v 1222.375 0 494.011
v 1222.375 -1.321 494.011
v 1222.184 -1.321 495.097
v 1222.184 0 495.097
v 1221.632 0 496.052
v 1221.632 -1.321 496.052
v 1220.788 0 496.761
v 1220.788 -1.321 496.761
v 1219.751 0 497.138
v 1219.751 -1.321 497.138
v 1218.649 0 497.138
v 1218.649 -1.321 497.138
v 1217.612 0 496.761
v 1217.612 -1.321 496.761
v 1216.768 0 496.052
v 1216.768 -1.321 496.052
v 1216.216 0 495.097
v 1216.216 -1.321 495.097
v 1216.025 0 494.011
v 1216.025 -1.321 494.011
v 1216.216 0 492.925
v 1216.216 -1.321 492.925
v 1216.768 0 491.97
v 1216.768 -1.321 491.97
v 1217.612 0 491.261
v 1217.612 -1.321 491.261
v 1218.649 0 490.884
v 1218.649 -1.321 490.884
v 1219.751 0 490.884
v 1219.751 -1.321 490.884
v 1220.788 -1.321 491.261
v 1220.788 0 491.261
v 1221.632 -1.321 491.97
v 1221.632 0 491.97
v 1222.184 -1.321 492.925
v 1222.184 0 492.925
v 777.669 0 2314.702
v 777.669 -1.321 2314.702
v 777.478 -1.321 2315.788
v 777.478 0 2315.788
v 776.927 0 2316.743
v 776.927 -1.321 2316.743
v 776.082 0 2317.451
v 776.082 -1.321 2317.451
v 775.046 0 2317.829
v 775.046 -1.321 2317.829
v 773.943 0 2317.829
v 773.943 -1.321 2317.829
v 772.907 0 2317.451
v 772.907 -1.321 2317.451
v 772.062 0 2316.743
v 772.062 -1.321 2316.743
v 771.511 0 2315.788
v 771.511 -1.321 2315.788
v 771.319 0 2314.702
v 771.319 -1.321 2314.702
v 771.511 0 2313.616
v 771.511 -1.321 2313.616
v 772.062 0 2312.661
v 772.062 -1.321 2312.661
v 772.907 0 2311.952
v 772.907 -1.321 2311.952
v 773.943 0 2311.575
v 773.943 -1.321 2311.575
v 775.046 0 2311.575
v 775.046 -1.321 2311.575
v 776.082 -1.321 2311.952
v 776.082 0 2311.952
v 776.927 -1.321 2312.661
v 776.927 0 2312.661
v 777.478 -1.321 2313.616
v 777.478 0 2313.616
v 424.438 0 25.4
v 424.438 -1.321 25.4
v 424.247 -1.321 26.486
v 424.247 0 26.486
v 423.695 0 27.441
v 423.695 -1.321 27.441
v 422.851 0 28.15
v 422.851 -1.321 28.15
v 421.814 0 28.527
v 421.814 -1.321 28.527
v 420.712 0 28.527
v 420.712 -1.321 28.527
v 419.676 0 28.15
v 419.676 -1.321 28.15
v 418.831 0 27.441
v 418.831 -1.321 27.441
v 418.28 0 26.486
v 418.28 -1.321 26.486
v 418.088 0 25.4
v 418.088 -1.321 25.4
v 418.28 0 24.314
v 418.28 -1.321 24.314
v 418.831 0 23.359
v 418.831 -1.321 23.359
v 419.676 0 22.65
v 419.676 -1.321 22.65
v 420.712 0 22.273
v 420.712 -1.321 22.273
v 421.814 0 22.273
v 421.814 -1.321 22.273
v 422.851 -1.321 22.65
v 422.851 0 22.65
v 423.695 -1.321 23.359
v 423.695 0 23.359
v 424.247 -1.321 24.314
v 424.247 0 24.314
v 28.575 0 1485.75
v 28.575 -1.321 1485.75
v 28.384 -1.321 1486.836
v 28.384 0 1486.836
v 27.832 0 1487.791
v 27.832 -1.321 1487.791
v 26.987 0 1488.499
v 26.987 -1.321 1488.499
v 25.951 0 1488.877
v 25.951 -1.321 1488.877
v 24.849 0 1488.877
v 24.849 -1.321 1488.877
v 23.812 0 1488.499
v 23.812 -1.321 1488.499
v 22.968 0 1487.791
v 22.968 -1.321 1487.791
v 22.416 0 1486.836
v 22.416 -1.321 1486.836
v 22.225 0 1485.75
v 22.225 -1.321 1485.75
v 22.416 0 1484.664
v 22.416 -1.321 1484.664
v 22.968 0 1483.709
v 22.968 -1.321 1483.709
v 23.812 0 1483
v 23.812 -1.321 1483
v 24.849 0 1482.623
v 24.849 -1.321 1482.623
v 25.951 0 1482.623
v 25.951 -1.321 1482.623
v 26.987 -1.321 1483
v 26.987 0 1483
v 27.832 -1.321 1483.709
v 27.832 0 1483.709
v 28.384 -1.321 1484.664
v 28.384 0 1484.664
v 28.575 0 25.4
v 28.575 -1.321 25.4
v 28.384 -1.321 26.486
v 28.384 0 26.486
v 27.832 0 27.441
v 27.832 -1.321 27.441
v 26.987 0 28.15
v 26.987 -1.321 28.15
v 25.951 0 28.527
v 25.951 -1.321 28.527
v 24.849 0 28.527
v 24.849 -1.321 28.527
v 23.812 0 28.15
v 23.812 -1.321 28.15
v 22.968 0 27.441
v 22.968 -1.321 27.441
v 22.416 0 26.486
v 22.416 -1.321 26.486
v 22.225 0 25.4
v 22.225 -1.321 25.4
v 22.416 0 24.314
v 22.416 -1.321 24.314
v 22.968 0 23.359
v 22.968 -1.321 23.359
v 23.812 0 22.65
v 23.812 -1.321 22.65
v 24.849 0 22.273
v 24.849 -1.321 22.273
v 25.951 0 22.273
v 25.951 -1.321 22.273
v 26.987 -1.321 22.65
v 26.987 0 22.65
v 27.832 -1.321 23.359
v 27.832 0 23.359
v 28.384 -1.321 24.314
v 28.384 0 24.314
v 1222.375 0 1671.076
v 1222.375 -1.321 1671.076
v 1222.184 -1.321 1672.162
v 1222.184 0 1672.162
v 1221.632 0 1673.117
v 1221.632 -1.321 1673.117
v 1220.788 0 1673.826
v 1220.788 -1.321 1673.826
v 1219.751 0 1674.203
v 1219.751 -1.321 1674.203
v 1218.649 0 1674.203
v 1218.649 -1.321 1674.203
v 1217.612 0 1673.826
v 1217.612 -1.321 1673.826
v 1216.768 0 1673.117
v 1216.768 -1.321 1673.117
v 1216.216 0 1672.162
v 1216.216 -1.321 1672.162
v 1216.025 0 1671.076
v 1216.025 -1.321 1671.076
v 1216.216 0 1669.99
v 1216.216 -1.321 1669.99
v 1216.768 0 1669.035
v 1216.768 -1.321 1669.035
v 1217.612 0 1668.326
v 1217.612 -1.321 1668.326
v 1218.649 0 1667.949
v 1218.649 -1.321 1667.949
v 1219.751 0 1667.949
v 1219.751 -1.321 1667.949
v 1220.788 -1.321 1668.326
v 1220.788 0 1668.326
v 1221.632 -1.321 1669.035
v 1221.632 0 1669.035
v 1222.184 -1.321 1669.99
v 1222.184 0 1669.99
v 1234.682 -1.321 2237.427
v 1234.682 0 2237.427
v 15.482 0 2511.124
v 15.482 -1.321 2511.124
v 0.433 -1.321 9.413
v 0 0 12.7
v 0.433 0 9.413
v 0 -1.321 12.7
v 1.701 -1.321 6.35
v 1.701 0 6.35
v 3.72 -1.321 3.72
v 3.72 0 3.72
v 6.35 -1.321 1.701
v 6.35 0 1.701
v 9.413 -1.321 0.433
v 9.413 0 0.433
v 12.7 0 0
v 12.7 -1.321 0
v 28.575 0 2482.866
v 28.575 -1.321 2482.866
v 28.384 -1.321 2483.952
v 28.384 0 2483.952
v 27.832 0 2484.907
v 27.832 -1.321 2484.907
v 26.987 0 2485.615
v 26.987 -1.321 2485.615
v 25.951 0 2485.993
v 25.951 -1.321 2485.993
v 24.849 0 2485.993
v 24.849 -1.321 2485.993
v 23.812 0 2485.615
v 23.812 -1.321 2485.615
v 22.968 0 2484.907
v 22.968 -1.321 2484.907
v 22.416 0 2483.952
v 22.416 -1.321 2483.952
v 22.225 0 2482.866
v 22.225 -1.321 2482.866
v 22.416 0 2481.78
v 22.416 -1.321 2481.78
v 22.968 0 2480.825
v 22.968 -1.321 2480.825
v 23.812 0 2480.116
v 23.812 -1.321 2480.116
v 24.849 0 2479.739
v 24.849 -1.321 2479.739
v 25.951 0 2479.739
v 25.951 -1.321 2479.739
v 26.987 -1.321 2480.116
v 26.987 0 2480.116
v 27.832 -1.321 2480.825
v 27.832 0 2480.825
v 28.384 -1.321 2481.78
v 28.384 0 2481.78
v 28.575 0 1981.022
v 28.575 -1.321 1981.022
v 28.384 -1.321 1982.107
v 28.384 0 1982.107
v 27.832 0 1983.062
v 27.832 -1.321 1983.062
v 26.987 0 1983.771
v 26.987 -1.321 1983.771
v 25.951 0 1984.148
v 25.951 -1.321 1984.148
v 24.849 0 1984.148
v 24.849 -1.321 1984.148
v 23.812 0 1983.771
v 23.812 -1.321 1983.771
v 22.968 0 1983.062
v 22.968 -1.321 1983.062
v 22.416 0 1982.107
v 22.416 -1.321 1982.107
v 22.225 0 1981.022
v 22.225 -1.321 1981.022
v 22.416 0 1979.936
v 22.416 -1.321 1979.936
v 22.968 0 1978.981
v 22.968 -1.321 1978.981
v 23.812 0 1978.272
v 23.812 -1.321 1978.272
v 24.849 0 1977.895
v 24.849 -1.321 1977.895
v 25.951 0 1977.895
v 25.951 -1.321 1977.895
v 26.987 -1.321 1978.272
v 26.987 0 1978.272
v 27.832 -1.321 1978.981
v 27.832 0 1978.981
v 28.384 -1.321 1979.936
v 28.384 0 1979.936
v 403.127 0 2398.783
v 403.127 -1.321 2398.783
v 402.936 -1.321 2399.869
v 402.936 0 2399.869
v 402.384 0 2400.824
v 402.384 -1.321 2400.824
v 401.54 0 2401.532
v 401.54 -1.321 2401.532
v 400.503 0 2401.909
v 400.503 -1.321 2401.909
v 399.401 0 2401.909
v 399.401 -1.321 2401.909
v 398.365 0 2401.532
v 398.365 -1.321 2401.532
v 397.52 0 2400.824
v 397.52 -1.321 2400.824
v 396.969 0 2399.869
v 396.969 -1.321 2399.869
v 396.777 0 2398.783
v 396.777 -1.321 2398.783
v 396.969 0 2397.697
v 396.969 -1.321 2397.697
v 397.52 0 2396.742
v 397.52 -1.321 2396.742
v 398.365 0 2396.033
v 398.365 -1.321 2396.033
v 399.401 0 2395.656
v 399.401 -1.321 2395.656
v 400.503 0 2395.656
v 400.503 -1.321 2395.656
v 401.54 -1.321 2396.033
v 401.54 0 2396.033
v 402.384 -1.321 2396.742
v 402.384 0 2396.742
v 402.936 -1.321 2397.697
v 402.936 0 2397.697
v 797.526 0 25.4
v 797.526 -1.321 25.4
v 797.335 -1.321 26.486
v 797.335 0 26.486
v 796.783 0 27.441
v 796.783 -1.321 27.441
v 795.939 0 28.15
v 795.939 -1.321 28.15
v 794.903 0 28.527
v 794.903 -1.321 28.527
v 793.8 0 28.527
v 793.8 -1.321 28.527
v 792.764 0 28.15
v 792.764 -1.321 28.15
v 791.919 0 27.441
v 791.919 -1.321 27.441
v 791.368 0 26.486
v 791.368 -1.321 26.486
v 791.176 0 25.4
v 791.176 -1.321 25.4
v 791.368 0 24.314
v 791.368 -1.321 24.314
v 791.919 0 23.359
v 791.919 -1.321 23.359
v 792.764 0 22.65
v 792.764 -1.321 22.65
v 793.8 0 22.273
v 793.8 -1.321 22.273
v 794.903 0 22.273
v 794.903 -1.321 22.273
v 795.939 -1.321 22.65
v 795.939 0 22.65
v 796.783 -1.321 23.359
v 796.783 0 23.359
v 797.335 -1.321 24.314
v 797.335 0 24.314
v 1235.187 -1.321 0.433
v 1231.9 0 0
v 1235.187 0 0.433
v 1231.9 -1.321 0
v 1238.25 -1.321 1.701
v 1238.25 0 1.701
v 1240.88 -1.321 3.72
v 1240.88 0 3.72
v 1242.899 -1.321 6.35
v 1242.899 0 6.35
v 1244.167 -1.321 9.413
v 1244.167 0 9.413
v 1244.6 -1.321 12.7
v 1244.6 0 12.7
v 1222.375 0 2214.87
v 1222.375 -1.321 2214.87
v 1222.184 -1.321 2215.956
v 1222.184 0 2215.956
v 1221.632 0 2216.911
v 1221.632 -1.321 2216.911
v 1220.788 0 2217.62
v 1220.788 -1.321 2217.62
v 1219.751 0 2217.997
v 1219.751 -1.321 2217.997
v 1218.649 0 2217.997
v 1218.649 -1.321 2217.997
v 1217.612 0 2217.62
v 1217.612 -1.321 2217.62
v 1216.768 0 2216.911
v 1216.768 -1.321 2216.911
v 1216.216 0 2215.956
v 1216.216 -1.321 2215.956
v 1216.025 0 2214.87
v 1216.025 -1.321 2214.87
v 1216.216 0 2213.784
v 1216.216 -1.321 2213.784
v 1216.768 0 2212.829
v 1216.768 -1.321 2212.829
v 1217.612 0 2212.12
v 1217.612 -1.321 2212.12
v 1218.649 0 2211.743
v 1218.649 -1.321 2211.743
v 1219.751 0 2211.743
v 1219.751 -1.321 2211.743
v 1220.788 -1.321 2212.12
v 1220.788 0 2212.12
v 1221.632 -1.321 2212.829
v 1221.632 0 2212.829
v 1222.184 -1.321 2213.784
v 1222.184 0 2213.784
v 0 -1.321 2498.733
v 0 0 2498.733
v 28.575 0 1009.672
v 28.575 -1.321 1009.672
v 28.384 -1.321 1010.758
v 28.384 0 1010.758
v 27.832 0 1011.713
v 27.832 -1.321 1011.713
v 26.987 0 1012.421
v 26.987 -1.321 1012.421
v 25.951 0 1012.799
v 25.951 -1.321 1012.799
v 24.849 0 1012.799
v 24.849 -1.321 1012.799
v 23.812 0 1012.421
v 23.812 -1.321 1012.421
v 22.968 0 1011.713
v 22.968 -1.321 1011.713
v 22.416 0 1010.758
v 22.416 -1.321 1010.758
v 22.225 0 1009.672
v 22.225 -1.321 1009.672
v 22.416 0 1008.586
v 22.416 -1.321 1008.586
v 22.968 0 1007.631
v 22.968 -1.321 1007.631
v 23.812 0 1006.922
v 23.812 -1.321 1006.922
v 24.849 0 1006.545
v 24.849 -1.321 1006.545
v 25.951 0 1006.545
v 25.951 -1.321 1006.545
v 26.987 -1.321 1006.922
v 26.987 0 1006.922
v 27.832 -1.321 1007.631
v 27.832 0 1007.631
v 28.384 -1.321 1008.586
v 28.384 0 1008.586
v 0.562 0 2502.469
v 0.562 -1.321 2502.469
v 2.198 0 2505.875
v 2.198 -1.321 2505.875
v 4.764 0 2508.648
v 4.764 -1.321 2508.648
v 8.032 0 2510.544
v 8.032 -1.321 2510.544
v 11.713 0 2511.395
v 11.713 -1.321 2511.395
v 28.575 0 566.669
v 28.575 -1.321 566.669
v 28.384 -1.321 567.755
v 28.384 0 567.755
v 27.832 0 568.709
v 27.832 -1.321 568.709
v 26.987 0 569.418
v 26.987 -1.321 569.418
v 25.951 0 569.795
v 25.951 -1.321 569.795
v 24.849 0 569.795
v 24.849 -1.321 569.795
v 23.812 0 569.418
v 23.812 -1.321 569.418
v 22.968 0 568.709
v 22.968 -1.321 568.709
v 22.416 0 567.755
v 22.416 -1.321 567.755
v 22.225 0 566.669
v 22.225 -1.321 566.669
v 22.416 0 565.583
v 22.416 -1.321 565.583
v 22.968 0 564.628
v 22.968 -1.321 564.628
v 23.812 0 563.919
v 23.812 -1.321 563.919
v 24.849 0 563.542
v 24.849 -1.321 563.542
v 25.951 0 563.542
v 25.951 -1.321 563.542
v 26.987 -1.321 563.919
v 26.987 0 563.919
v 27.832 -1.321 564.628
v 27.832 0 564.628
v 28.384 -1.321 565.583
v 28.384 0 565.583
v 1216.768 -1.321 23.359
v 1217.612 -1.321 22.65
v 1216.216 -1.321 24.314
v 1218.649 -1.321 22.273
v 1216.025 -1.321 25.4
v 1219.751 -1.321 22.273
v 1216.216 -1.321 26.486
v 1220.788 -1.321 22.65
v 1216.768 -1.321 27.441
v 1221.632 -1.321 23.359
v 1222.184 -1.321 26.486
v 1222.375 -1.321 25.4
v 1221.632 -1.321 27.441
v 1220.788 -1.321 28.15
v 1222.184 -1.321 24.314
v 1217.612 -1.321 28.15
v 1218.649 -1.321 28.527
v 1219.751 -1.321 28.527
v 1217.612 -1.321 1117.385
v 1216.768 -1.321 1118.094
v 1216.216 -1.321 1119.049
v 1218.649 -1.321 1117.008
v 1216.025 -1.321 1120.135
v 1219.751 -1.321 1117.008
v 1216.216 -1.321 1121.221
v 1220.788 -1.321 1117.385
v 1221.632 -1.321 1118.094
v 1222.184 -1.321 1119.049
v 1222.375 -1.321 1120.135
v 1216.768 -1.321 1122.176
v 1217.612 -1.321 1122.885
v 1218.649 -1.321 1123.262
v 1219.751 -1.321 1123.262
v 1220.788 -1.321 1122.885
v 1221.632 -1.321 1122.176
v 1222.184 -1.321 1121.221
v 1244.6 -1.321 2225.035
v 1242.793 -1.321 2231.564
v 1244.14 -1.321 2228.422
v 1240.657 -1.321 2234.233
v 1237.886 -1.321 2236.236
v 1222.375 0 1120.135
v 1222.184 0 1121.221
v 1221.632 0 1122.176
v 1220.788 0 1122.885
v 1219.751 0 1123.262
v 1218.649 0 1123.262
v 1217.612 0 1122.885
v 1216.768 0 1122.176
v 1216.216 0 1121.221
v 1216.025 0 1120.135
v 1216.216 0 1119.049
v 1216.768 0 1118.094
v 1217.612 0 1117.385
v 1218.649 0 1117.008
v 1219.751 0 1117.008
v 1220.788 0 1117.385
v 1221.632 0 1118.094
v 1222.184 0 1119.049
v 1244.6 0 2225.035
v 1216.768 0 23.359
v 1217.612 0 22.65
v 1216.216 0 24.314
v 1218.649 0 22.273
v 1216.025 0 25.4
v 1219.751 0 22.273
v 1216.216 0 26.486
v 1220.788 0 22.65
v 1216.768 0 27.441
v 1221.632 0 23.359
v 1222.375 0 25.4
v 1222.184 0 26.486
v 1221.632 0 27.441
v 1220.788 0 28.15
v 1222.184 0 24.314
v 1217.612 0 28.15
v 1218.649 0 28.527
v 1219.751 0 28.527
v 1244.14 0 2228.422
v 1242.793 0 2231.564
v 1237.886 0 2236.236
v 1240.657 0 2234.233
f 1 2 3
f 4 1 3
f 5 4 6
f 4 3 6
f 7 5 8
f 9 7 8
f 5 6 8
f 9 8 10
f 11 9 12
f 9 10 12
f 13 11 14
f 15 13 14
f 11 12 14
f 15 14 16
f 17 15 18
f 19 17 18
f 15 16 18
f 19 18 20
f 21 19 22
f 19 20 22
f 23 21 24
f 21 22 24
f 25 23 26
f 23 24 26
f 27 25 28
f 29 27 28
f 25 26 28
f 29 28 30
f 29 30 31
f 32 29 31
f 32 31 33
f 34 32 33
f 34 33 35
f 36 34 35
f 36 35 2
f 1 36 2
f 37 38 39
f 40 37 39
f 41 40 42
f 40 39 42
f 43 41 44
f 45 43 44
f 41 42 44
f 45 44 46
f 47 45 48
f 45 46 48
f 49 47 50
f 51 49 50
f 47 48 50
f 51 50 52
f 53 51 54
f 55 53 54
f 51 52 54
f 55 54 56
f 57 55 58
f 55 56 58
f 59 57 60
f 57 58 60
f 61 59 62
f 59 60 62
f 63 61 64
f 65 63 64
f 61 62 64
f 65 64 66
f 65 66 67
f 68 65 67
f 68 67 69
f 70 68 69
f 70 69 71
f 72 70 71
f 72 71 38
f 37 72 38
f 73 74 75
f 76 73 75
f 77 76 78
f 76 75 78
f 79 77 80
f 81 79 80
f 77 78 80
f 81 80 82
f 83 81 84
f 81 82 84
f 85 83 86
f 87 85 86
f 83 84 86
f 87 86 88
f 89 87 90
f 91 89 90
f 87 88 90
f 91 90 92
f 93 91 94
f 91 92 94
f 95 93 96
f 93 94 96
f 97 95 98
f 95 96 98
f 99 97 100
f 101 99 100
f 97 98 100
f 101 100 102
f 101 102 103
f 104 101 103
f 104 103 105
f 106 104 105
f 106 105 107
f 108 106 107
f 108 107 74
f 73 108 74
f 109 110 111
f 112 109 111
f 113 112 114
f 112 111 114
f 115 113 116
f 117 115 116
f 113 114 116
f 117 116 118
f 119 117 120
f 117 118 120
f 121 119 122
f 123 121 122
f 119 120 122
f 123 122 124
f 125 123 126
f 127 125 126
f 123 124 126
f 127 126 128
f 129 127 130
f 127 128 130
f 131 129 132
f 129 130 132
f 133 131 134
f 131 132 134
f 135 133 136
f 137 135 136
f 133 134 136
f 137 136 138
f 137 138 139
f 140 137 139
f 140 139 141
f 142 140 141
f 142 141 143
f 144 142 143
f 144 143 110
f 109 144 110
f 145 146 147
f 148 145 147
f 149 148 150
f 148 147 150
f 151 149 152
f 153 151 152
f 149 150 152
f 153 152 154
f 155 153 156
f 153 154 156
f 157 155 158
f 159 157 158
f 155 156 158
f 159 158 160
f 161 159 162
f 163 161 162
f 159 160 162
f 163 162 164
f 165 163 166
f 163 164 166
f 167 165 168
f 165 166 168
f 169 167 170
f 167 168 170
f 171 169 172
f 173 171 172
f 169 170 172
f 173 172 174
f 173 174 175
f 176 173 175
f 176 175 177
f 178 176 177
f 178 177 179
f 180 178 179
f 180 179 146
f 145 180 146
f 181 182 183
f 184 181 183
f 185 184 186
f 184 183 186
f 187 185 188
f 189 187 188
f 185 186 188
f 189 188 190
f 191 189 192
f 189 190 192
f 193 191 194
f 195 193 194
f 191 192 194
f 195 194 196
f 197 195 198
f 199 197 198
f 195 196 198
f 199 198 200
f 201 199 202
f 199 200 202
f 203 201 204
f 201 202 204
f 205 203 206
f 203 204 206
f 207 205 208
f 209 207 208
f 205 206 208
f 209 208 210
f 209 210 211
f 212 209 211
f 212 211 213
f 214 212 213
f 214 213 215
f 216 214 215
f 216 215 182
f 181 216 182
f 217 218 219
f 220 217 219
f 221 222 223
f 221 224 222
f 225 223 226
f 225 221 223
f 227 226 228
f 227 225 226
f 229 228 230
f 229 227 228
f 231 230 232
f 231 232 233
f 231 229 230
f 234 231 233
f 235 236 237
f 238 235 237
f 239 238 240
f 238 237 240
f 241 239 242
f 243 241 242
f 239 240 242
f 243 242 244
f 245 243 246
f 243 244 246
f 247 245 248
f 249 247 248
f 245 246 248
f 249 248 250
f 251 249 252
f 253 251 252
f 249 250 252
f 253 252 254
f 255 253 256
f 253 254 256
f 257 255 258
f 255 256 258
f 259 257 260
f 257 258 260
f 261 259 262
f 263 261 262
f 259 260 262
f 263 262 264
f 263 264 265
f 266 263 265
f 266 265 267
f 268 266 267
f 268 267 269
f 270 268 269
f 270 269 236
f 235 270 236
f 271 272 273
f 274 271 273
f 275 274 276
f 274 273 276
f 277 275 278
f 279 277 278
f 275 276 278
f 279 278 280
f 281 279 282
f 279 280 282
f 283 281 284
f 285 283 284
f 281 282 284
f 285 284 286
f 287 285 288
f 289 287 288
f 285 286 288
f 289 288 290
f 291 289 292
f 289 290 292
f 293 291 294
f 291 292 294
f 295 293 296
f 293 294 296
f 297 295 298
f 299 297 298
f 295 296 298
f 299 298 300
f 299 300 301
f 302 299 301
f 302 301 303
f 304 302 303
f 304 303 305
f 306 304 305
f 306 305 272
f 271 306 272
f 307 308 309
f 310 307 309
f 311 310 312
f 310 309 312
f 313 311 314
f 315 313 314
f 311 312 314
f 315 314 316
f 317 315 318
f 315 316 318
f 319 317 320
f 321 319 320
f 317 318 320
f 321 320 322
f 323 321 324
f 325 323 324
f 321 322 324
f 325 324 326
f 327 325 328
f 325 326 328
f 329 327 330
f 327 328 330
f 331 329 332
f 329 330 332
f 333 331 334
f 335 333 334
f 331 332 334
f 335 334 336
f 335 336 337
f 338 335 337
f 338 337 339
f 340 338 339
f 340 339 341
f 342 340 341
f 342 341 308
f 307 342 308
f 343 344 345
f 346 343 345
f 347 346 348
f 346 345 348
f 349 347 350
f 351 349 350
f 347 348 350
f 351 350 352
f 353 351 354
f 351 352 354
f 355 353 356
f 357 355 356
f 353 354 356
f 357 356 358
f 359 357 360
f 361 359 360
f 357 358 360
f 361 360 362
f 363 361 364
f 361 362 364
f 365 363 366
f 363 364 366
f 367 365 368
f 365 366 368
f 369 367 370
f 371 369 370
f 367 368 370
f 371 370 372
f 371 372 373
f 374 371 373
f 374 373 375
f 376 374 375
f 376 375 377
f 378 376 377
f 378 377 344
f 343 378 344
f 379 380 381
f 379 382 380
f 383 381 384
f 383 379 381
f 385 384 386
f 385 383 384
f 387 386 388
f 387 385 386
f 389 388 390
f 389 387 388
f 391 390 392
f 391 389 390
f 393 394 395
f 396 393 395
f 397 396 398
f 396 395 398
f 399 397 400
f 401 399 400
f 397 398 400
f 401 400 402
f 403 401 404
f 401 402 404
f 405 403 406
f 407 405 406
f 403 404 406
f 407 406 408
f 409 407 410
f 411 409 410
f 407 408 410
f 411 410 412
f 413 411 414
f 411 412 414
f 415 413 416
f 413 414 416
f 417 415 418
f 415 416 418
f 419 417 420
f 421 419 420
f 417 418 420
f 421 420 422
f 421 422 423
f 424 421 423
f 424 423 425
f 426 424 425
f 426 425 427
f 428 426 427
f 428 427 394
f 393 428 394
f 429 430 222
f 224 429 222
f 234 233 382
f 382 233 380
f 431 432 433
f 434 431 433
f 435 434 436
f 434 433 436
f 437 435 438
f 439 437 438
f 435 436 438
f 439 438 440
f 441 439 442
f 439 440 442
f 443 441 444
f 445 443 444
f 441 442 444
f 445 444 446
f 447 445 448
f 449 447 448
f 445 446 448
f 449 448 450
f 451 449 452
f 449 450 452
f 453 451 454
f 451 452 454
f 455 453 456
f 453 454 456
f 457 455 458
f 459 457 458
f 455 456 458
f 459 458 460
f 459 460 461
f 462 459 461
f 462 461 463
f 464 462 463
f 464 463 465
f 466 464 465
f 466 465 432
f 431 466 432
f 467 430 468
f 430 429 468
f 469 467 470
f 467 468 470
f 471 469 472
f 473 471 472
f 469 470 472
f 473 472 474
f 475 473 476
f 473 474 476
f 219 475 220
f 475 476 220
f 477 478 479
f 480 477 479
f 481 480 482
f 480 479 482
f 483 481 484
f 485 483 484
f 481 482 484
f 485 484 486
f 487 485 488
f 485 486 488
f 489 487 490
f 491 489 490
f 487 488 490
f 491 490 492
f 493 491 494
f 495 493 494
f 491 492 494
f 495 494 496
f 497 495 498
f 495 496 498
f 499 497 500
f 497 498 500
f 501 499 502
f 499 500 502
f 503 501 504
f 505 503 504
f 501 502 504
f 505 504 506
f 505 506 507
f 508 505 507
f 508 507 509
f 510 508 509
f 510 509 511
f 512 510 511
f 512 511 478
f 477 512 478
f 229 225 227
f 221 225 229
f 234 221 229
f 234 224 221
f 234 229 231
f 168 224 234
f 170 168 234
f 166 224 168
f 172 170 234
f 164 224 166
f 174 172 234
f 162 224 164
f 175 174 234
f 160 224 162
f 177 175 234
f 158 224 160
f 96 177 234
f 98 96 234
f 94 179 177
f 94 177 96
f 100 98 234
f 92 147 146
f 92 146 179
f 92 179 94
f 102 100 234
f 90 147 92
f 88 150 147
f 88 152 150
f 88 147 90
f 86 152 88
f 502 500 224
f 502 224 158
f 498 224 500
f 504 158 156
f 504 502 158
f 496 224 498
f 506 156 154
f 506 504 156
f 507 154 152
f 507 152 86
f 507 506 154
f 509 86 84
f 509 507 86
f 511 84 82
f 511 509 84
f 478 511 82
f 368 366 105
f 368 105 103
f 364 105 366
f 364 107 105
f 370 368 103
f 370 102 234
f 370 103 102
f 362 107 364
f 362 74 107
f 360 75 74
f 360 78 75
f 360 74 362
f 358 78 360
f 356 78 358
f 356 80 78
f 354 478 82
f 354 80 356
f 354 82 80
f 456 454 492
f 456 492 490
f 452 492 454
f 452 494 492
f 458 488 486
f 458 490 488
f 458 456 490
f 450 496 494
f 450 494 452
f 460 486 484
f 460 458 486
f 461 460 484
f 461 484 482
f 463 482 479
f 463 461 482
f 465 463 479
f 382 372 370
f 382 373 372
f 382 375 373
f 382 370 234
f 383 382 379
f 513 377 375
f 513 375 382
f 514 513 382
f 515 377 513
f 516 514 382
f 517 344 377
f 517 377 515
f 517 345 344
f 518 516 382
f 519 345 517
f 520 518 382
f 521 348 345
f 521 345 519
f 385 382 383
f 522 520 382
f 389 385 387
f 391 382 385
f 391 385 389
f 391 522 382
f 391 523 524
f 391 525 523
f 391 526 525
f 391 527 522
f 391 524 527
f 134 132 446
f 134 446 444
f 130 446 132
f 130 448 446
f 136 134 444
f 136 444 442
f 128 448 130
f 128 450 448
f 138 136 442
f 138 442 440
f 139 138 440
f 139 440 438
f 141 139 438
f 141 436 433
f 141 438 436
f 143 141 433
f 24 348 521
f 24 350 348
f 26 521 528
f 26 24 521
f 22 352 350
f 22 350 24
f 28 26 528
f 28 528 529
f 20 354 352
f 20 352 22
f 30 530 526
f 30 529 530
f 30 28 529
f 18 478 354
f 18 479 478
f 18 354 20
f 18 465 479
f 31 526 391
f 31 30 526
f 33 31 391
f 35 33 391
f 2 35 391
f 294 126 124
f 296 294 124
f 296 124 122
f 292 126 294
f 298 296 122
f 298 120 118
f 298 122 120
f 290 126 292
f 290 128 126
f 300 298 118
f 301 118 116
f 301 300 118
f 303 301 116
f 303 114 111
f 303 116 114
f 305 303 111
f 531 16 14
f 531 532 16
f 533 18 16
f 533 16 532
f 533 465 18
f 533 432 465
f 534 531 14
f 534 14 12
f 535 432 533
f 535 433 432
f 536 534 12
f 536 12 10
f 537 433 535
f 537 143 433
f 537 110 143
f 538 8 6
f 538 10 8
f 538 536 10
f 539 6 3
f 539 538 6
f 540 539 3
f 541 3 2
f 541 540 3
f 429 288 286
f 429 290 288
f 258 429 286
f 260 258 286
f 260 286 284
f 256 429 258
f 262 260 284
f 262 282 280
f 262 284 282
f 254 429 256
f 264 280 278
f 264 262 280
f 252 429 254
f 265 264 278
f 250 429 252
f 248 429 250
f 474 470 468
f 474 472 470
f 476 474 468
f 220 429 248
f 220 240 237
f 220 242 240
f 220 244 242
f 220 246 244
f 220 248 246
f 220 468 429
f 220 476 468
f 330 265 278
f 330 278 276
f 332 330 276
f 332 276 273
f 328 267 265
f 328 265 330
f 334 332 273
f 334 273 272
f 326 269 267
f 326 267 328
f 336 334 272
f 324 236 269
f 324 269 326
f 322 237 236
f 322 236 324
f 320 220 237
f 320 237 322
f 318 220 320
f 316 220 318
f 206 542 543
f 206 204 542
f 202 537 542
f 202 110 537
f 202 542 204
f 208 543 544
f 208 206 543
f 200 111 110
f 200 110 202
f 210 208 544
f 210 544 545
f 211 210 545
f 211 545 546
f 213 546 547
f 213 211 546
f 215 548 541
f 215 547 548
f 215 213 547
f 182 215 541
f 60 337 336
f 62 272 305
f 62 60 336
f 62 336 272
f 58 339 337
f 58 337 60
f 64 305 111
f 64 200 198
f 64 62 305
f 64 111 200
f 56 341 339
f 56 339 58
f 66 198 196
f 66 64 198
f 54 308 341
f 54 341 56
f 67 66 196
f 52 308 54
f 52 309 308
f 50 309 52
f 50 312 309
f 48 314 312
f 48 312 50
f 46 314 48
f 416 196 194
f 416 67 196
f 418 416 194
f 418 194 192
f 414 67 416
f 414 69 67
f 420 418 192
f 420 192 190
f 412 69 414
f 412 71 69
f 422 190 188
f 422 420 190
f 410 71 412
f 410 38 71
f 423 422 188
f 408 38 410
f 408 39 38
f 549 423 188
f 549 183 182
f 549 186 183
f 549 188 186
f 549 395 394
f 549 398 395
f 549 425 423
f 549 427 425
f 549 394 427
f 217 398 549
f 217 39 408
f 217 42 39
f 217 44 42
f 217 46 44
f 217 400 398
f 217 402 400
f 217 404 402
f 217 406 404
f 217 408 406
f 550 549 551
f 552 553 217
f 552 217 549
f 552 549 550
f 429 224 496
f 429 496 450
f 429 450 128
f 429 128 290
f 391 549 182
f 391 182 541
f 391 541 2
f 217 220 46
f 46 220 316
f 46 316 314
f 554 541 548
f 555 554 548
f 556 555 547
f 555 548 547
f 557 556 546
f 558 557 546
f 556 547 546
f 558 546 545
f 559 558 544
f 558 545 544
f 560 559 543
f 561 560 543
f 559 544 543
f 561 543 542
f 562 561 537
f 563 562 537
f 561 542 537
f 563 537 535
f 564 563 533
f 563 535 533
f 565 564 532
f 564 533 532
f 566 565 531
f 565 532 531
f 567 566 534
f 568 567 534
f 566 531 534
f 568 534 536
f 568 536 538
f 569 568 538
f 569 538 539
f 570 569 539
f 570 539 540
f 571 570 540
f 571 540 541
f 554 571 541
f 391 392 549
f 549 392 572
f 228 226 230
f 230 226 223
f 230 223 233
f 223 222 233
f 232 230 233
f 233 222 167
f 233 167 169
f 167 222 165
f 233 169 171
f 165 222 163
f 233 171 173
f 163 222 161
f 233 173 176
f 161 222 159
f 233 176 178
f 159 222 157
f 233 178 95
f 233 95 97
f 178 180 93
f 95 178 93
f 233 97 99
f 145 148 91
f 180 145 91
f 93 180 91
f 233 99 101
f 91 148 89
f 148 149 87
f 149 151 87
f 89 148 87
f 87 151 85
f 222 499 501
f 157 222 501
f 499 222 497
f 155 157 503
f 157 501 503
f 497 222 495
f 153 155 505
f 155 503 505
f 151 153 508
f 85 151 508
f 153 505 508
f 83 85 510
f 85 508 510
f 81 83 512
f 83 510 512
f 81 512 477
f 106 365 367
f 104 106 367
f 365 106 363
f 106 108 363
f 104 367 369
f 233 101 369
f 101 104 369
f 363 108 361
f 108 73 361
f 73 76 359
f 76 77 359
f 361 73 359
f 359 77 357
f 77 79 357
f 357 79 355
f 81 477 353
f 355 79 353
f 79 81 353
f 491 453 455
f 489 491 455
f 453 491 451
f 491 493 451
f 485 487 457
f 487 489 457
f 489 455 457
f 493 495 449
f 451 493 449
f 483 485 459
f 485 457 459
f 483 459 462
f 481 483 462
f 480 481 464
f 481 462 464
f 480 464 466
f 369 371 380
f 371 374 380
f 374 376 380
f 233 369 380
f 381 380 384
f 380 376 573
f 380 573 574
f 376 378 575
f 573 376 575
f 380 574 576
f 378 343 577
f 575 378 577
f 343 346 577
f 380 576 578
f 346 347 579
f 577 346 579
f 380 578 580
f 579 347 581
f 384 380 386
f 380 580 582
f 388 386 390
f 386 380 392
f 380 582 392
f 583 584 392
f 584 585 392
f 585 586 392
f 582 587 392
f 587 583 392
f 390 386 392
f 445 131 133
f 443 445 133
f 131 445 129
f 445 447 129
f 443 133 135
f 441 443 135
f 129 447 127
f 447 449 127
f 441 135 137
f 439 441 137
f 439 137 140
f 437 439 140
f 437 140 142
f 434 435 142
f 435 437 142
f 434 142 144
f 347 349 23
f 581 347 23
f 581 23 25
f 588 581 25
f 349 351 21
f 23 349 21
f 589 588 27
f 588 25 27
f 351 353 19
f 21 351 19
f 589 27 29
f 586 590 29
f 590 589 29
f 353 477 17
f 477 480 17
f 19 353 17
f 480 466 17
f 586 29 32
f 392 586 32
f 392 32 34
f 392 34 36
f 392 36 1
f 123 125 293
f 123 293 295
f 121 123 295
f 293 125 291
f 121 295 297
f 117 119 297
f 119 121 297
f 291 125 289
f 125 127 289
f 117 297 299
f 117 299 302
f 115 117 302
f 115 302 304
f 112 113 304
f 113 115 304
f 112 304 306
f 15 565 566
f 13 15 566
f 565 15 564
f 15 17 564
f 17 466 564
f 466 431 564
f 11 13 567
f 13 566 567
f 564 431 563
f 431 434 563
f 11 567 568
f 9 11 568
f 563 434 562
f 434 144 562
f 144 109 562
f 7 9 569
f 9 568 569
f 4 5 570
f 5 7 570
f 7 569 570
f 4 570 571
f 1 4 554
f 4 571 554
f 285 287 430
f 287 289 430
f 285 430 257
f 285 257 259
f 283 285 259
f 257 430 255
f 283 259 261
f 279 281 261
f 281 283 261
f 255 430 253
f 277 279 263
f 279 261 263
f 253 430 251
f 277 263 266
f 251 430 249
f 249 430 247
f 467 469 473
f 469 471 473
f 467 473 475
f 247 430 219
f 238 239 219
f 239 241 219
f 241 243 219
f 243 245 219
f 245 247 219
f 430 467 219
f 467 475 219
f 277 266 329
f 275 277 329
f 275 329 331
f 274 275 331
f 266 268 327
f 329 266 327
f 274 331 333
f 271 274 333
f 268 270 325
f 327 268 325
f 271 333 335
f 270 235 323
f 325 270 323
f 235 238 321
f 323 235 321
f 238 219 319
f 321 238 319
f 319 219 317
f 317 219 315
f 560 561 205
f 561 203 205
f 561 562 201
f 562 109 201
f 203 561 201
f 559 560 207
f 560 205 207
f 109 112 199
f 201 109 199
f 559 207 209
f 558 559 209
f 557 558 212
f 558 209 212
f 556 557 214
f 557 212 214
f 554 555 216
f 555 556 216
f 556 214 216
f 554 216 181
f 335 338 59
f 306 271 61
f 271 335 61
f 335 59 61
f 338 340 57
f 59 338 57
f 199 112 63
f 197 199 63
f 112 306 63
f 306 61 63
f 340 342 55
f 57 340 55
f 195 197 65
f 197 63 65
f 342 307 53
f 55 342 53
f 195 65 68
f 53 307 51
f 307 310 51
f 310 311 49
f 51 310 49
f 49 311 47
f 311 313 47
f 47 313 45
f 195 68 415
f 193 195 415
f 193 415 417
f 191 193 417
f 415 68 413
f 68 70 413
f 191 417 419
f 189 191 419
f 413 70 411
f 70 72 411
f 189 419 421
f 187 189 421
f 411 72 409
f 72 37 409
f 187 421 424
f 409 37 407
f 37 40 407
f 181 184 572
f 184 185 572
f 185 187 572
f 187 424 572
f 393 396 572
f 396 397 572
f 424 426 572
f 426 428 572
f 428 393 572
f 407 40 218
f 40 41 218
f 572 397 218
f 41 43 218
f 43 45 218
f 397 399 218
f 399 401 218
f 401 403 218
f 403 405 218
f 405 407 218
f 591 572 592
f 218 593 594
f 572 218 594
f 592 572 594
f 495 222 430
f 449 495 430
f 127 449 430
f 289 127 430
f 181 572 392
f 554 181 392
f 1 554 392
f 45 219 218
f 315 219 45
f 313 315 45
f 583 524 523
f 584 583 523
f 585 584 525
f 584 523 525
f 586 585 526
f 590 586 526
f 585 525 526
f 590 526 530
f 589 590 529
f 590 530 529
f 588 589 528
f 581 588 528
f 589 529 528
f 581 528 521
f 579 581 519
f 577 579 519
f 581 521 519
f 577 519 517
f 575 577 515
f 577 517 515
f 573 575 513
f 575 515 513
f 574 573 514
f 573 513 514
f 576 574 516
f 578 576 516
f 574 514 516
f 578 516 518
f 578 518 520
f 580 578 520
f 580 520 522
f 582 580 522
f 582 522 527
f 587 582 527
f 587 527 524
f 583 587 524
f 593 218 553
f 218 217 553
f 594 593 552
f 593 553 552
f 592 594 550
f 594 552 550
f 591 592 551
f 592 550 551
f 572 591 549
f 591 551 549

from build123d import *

# Parameters (mm, degrees)
F1_DEPTH = 1.3208
F2_R     = 3.175
F3_DEPTH = 25.4
F4_R     = 12.7


with BuildPart() as f1:
    # F0 (on Front) → F1 (new body)
    with BuildSketch(Plane.XZ):
        Polygon((0, 2514.6), (0, 0), (1244.6, 0), (1244.6, 2235.2), align=None)
    extrude(amount=F1_DEPTH)

    # F2 (on face) → F3 (cut)
    with BuildSketch(Plane.XZ.offset(1.3208)):
        with Locations((25.4, 2482.865801)):
            Circle(F2_R)
        with Locations((1219.2, 2214.869882)):
            Circle(F2_R)
        with Locations((399.952063, 2398.782685)):
            Circle(F2_R)
        with Locations((774.494473, 2314.701736)):
            Circle(F2_R)
        with Locations((1219.2, 25.4)):
            Circle(F2_R)
        with Locations((25.4, 25.4)):
            Circle(F2_R)
        with Locations((421.263099, 25.4)):
            Circle(F2_R)
        with Locations((794.35122, 25.4)):
            Circle(F2_R)
        with Locations((1219.2, 1120.134941)):
            Circle(F2_R)
        with Locations((1219.2, 1671.076059)):
            Circle(F2_R)
        with Locations((1219.2, 494.011074)):
            Circle(F2_R)
        with Locations((25.4, 1485.749841)):
            Circle(F2_R)
        with Locations((25.4, 1009.671807)):
            Circle(F2_R)
        with Locations((25.4, 566.66863)):
            Circle(F2_R)
        with Locations((25.4, 1981.021523)):
            Circle(F2_R)
    extrude(amount=-F3_DEPTH, mode=Mode.SUBTRACT)

    # F4
    f4_edges = [f1.edges().sort_by_distance(p)[0] for p in [
        (1244.6, -0.6604, 2235.2),
        (0, -0.6604, 2514.6),
        (1244.6, -0.6604, 0),
        (0, -0.6604, 0),
    ]]
    fillet(f4_edges, radius=F4_R)


solid = f1.part
